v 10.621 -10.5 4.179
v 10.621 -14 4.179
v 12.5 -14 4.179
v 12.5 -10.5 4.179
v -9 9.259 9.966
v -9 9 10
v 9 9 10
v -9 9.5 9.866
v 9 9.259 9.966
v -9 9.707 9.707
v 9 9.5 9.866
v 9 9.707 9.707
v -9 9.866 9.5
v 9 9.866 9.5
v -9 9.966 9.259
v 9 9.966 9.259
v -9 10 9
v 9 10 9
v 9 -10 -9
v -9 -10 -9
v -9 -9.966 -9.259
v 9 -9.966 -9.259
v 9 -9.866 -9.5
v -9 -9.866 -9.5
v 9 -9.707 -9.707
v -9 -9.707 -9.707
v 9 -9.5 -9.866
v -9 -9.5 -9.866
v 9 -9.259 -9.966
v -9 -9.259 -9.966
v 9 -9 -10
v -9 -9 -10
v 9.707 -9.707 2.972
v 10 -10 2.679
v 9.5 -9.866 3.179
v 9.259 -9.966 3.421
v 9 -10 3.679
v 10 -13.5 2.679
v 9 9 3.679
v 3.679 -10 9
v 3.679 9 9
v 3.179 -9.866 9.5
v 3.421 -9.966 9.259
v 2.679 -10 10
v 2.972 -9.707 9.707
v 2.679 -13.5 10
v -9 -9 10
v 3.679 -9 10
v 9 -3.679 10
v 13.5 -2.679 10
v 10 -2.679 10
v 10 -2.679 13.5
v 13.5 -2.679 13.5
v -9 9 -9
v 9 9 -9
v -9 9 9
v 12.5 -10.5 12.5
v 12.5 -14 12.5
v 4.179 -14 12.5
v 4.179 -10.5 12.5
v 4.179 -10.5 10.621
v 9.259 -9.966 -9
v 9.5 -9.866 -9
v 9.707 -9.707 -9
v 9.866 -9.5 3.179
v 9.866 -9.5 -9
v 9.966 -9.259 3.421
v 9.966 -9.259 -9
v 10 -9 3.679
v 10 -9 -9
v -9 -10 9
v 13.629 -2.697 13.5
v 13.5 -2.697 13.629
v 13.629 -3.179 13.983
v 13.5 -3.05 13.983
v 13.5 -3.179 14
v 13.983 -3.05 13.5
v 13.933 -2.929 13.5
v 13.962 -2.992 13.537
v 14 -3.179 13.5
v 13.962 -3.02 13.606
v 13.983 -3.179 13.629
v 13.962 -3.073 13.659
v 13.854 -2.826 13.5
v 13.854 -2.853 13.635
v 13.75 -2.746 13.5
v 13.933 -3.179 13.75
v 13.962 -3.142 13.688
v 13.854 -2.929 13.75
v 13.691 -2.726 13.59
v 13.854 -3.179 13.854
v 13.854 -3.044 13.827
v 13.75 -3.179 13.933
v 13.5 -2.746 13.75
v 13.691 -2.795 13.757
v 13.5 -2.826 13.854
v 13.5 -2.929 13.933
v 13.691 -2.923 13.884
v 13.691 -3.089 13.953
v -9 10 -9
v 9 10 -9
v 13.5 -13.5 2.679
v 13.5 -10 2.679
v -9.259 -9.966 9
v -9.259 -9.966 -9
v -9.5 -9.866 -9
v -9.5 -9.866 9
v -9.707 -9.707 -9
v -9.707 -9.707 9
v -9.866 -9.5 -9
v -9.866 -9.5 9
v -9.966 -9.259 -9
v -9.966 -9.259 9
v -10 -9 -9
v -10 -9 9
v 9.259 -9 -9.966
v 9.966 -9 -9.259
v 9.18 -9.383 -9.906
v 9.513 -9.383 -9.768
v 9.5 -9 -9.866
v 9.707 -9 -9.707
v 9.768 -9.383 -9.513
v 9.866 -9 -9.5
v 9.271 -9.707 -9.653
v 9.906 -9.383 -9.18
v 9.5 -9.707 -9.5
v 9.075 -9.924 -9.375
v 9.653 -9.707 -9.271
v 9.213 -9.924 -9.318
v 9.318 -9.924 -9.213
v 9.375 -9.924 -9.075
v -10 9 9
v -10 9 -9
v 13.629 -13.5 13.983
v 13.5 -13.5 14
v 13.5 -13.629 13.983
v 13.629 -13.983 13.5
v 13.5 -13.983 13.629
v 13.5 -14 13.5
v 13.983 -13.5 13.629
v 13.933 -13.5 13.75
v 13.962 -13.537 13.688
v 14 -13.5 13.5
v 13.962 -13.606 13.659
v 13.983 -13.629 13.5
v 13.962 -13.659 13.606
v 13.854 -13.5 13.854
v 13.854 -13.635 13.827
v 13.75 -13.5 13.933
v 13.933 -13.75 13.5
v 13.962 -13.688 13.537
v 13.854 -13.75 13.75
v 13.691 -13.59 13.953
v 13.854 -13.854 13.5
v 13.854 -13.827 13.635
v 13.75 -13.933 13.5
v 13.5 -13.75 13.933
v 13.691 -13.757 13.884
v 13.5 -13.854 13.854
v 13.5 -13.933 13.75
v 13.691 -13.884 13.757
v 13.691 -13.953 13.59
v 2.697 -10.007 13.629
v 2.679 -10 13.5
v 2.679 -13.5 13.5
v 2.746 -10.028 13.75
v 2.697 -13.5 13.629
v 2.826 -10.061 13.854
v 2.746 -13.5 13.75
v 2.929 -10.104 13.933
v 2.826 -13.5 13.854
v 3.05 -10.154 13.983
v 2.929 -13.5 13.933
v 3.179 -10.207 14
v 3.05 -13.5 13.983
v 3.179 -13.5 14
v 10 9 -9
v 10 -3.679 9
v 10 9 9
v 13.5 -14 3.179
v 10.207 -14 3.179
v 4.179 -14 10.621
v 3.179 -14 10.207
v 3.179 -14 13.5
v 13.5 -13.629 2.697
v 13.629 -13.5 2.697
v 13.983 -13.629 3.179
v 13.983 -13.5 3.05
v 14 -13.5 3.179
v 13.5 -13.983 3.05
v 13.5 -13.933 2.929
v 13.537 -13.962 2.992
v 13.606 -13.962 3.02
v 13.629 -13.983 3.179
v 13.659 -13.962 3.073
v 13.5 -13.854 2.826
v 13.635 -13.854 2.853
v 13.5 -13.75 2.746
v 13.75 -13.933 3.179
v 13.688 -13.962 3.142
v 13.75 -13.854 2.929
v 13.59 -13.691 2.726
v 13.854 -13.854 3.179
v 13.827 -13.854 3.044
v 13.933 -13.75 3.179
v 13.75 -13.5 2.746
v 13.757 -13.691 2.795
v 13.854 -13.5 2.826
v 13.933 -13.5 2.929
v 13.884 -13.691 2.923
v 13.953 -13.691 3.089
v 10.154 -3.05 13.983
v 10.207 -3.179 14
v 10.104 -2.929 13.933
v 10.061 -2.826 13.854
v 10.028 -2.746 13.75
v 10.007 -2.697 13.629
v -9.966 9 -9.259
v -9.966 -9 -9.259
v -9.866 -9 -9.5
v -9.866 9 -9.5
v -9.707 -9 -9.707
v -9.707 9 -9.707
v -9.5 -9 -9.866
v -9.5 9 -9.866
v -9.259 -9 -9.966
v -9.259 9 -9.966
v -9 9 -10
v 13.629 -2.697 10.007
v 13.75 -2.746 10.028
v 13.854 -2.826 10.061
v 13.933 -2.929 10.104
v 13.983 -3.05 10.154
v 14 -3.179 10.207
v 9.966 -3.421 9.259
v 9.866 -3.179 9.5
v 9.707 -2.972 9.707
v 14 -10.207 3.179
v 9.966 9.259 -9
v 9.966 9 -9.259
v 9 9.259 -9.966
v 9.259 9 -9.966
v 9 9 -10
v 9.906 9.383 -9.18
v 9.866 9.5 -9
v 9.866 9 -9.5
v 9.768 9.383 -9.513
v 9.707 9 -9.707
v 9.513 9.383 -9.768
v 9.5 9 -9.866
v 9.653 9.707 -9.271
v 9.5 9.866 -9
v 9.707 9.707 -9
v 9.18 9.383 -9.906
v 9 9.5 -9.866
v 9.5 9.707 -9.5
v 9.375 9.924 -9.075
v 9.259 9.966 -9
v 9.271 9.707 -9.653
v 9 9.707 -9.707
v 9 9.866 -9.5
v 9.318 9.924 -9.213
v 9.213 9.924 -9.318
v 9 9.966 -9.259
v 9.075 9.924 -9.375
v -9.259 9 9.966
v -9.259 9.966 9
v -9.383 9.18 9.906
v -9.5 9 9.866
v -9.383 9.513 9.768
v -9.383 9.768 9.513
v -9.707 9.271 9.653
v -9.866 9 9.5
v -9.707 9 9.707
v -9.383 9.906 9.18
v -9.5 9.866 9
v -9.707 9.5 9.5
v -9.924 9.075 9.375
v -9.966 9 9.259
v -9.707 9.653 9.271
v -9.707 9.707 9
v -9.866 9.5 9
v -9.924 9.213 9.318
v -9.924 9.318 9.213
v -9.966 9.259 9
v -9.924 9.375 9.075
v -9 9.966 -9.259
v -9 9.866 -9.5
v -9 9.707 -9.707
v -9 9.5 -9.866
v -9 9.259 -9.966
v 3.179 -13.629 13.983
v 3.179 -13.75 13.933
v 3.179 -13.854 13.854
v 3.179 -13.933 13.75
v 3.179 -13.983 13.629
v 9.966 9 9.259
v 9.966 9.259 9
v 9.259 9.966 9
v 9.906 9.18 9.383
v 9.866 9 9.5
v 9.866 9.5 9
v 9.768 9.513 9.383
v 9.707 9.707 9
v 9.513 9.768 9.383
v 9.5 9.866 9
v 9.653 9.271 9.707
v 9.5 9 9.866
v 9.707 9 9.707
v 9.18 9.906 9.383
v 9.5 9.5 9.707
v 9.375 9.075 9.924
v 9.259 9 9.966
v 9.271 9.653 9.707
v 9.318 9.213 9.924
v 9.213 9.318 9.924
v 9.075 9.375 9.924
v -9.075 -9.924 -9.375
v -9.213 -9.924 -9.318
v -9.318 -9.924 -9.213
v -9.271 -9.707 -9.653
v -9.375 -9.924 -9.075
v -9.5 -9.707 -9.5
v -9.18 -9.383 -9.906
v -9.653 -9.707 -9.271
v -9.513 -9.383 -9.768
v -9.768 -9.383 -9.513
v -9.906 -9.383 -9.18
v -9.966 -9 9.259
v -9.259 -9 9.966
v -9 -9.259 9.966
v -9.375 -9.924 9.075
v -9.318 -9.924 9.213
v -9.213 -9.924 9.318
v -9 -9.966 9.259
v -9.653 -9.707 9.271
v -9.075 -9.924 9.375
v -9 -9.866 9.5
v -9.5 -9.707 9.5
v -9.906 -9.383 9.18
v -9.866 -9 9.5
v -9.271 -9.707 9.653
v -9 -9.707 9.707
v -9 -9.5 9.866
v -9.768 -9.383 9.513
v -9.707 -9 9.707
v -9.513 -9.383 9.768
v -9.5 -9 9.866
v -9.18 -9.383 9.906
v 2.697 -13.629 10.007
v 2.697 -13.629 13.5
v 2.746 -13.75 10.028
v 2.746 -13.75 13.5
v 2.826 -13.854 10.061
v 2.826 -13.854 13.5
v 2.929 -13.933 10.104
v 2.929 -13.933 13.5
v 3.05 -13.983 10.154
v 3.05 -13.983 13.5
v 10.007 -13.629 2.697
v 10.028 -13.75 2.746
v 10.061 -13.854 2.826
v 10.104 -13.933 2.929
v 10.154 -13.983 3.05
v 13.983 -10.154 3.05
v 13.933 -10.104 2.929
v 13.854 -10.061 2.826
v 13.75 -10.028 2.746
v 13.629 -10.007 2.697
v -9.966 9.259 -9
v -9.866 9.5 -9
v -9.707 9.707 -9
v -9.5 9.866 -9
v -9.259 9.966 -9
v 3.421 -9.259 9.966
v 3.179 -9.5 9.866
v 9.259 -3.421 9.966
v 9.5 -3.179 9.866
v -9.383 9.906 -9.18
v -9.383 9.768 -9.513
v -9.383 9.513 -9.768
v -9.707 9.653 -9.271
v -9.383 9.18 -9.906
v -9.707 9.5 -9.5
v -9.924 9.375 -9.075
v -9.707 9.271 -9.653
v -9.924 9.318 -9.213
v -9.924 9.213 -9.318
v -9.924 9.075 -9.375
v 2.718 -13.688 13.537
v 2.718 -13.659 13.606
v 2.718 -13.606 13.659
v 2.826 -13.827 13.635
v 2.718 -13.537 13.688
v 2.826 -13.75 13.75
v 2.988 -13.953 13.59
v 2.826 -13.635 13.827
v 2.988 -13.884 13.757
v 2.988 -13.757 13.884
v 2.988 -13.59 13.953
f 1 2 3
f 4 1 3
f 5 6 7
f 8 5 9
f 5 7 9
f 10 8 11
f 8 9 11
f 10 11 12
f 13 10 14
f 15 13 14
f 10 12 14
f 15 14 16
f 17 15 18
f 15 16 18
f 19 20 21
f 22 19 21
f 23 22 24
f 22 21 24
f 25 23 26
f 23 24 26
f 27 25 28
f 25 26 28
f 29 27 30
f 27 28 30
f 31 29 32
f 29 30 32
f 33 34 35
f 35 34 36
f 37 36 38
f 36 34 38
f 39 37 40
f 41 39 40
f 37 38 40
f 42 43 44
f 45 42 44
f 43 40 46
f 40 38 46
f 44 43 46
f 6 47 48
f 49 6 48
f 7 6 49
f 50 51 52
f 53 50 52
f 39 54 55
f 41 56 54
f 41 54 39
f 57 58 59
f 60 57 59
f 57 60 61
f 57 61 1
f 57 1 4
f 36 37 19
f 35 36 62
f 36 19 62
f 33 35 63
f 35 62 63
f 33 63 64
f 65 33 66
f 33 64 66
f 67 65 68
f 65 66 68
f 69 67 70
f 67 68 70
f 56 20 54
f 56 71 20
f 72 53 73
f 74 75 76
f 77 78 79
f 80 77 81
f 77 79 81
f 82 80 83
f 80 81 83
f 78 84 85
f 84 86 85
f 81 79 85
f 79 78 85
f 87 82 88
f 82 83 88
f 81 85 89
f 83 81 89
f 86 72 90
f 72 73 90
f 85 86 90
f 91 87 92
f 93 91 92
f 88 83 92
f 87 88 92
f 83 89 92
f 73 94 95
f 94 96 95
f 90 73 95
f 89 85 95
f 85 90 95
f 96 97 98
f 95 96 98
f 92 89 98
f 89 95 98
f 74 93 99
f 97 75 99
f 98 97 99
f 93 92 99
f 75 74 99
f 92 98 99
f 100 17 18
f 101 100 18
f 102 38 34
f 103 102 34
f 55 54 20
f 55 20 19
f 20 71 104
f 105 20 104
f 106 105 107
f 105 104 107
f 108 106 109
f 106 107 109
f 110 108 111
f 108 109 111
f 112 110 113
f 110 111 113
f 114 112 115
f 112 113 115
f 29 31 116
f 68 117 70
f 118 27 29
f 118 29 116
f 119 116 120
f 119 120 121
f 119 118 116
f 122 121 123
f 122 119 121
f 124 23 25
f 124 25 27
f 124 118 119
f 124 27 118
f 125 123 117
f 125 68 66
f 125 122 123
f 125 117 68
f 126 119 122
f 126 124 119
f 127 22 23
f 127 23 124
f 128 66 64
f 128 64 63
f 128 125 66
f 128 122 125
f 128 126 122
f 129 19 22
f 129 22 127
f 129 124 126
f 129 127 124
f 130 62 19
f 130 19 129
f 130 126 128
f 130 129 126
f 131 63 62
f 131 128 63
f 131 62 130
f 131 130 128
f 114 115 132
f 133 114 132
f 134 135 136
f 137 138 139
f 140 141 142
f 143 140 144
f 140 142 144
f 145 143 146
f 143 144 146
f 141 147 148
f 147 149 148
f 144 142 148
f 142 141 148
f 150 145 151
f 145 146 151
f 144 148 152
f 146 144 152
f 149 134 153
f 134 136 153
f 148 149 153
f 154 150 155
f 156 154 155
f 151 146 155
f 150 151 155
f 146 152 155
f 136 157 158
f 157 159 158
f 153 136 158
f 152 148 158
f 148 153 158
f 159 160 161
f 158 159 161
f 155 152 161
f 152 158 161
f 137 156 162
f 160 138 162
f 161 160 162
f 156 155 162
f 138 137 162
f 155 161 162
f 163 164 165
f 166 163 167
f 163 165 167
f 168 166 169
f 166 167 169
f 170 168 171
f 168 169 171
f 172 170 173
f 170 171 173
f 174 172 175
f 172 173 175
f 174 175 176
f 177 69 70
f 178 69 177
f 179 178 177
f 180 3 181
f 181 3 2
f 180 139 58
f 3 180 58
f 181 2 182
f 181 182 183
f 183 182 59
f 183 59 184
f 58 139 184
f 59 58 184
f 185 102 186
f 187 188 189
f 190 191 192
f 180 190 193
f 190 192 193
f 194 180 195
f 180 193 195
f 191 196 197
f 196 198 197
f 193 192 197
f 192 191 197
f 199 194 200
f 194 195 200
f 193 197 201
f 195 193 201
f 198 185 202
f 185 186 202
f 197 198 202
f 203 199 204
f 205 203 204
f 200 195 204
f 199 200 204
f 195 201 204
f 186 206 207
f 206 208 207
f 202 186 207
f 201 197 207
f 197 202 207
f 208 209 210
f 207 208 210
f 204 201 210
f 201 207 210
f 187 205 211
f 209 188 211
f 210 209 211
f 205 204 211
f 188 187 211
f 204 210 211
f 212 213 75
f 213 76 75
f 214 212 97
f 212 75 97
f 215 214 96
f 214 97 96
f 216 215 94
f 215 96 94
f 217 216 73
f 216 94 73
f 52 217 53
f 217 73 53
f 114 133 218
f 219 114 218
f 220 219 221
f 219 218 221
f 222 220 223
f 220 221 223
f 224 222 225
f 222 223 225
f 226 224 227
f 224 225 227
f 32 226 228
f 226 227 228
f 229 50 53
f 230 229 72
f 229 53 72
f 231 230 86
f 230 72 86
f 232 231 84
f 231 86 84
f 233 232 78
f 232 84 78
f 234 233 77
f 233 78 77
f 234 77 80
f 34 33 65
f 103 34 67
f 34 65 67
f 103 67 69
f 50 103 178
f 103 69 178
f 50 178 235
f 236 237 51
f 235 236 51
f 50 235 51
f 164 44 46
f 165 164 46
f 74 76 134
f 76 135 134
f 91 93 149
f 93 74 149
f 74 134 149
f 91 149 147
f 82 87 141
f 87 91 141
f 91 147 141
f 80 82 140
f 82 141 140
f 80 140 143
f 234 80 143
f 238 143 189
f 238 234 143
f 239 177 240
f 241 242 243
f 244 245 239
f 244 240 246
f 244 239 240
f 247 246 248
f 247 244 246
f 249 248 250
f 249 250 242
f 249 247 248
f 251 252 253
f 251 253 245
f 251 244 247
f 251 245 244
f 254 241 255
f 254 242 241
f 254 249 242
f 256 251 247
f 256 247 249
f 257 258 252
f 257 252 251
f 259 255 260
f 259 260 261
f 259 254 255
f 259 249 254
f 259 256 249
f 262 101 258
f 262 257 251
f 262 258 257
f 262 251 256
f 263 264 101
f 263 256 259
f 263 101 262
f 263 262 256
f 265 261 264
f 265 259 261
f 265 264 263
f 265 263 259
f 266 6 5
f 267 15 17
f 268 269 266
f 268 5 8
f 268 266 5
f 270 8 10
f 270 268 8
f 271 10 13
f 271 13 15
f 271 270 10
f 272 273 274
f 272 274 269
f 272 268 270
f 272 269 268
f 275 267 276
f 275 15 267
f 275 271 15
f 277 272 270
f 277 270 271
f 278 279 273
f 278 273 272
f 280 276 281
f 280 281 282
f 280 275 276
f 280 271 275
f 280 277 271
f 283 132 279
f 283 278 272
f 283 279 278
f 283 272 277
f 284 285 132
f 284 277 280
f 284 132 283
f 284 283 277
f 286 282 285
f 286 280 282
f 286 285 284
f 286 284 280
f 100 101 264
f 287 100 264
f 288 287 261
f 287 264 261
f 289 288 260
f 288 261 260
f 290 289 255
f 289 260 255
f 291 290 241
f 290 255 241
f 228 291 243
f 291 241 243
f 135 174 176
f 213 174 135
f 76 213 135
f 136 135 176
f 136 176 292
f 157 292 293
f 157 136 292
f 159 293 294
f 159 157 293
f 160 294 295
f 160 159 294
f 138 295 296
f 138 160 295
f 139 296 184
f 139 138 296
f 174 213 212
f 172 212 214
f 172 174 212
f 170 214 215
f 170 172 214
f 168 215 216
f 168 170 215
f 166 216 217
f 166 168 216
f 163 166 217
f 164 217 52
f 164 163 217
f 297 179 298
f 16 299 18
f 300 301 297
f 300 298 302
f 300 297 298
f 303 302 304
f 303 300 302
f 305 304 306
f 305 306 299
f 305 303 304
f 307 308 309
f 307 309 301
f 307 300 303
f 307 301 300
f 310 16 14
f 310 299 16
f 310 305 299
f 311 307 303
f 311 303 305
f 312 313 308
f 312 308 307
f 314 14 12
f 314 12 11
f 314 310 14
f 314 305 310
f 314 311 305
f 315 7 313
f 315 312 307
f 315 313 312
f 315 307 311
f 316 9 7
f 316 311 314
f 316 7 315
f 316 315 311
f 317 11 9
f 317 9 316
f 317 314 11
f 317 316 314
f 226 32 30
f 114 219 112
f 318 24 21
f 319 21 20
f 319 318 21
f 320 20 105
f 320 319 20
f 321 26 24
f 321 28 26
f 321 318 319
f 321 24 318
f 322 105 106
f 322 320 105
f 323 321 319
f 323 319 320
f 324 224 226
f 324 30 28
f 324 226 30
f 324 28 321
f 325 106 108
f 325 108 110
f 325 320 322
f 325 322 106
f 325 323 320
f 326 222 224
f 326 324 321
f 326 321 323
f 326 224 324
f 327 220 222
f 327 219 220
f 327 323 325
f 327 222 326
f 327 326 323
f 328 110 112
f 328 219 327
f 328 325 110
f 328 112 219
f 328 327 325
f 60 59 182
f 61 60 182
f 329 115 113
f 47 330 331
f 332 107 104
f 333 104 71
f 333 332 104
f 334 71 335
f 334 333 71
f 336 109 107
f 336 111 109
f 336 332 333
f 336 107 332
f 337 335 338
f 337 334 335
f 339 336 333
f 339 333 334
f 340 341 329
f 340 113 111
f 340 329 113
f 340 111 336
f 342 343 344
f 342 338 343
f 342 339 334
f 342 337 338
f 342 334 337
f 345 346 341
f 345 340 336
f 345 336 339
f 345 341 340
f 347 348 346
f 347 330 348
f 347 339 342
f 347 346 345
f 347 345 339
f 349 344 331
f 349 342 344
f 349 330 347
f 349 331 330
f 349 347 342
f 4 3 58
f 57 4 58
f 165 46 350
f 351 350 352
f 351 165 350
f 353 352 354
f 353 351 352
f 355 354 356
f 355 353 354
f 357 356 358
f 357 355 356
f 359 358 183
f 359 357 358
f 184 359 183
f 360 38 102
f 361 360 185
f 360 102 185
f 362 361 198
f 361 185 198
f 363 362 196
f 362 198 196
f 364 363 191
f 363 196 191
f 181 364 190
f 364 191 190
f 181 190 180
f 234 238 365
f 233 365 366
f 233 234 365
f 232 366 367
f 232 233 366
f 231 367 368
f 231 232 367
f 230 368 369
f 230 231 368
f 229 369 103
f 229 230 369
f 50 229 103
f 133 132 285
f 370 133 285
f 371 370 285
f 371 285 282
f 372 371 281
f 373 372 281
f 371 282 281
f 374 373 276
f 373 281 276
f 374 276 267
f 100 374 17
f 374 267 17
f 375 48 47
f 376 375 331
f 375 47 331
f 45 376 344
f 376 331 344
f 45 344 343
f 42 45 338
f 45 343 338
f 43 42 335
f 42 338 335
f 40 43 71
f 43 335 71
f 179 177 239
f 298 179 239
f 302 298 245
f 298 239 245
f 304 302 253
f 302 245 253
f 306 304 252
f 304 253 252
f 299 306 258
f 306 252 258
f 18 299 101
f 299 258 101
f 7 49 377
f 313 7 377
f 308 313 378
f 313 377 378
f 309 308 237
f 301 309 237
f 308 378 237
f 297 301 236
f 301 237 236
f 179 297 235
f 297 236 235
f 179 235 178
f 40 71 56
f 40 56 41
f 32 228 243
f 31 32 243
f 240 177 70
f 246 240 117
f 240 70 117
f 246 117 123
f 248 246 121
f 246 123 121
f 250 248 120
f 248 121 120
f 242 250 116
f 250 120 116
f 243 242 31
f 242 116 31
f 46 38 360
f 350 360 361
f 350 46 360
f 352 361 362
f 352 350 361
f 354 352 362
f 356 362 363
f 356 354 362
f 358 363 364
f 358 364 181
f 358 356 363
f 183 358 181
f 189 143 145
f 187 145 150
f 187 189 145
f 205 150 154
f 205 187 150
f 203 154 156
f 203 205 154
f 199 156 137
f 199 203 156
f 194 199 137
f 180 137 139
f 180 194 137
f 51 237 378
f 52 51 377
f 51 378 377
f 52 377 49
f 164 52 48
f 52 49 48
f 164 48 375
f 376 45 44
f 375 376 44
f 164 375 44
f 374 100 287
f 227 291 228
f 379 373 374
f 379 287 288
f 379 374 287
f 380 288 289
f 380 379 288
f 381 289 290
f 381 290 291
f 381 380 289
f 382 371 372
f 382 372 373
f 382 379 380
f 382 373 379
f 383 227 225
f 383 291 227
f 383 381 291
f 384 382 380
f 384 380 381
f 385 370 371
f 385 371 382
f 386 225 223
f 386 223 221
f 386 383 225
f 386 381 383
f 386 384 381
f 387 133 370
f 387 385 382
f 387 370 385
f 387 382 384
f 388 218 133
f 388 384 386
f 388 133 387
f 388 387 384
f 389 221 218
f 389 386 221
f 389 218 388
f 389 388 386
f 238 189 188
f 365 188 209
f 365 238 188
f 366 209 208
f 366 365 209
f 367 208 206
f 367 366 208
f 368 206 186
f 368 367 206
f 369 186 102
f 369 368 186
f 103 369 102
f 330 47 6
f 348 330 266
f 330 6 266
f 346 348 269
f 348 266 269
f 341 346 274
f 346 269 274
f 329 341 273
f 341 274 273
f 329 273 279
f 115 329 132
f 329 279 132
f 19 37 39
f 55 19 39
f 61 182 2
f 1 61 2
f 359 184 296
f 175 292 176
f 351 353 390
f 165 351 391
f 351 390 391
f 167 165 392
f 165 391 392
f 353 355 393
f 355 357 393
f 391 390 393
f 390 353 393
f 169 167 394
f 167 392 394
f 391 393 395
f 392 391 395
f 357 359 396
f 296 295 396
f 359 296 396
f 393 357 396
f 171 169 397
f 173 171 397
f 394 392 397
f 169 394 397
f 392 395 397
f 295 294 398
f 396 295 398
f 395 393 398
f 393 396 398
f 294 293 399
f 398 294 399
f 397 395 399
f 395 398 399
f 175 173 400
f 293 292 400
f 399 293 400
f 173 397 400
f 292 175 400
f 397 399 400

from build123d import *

# Parameters (mm, degrees)
IZIM1_W                     = 20
IZIM1_H                     = 20
Y_KSEKLIK_EKSTR_ZYON1_DEPTH = 10
BO_ALTMA1_T                 = -1
Y_KSEKLIK_EKSTR_ZYON3_DEPTH = 4
Y_KSEKLIK_EKSTR_ZYON4_DEPTH = 4
Y_KSEKLIK_EKSTR_ZYON5_REACH = 33.113
RADYUS1_R                   = 1
RADYUS2_R                   = 1
RADYUS3_R                   = 0.5
KES_EKSTR_ZYON1_DEPTH       = 3.5


with BuildPart() as part:
    # Çizim1 → Yükseklik-Ekstrüzyon1 (new, symmetric)
    with BuildSketch(Plane.XY):
        Rectangle(IZIM1_W, IZIM1_H)
    extrude(amount=Y_KSEKLIK_EKSTR_ZYON1_DEPTH, both=True)

    # İç Boşaltma1
    bo_altma1_openings = [part.faces().sort_by_distance(p)[0] for p in [
        (0, -10, 0),
    ]]
    offset(amount=BO_ALTMA1_T, openings=bo_altma1_openings, kind=Kind.INTERSECTION)

    # Çizim6 → Yükseklik-Ekstrüzyon3 (add)
    with BuildSketch(Plane(origin=(10, 0, 0), x_dir=(0, 0, -1), z_dir=(1, 0, 0))):
        Polygon((-2.679491924, -10), (-10, -2.679491924), (-10, -10), align=None)
        Polygon((-10, -10), (-10, -2.679491924), (-14, -2.679491924), (-14, -14), (-2.679491924, -14), (-2.679491924, -10), align=None)
    extrude(amount=Y_KSEKLIK_EKSTR_ZYON3_DEPTH)

    # Çizim7 → Yükseklik-Ekstrüzyon4 (add)
    with BuildSketch(Plane.XY.offset(10)):
        Polygon((10, -2.679491924), (2.679491924, -10), (2.679491924, -14), (10, -14), align=None)
    extrude(amount=Y_KSEKLIK_EKSTR_ZYON4_DEPTH)

    # Yükseklik-Ekstrüzyon5: up to this face of the body (flat: up to its plane)
    y_kseklik_ekstr_zyon5_end = Plane(part.part.faces().sort_by_distance((0, 9, 0))[0])
    # Çizim8 → Yükseklik-Ekstrüzyon5 (add, up to the picked face)
    with BuildSketch(Plane.XZ.offset(14), mode=Mode.PRIVATE) as y_kseklik_ekstr_zyon5_sk1:
        Polygon((10, 2.679491924), (2.679491924, 10), (10, 10), align=None)
    y_kseklik_ekstr_zyon5_tool1 = split(extrude(y_kseklik_ekstr_zyon5_sk1.sketch, amount=-Y_KSEKLIK_EKSTR_ZYON5_REACH, mode=Mode.PRIVATE), bisect_by=y_kseklik_ekstr_zyon5_end, keep=Keep.BOTH, mode=Mode.PRIVATE)
    add(y_kseklik_ekstr_zyon5_tool1.solids().sort_by(Axis((7.559831, -14, 7.559831), (0, 1, 0)))[0])

    # Radyus1
    # the kernel refuses this fillet: 1 mm, written as the material it takes off along each edge
    with BuildSketch(Plane(origin=(-9, 9, 9), x_dir=(0, 0, 1), z_dir=(-1, 0, 0))) as radyus1_piece_1_section:
        Polygon((0, 0), (RADYUS1_R, 0), (RADYUS1_R, RADYUS1_R), (0, RADYUS1_R), align=None)
    radyus1_piece_1 = extrude(amount=RADYUS1_R, mode=Mode.PRIVATE)
    radyus1_piece_1 = radyus1_piece_1 - Plane(origin=(-9, 9, 9), x_dir=(0, -0.7071067811865475, -0.7071067811865475), z_dir=(-1, 0, 0)) * Sphere(RADYUS1_R, mode=Mode.PRIVATE)
    add(radyus1_piece_1, mode=Mode.SUBTRACT)
    with BuildSketch(Plane(origin=(9, 9, 9), x_dir=(1, 0, 0), z_dir=(0, 0, 1))) as radyus1_piece_2_section:
        Polygon((0, 0), (RADYUS1_R, 0), (RADYUS1_R, RADYUS1_R), (0, RADYUS1_R), align=None)
    radyus1_piece_2 = extrude(amount=RADYUS1_R, mode=Mode.PRIVATE)
    radyus1_piece_2 = radyus1_piece_2 - Plane(origin=(9, 9, 9), x_dir=(-0.7071067811865475, -0.7071067811865475, 0), z_dir=(0, 0, 1)) * Sphere(RADYUS1_R, mode=Mode.PRIVATE)
    add(radyus1_piece_2, mode=Mode.SUBTRACT)
    with BuildSketch(Plane(origin=(-9, 9, -9), x_dir=(0, 1, 0), z_dir=(-1, 0, 0))) as radyus1_piece_3_section:
        Polygon((0, 0), (RADYUS1_R, 0), (RADYUS1_R, RADYUS1_R), (0, RADYUS1_R), align=None)
    radyus1_piece_3 = extrude(amount=RADYUS1_R, mode=Mode.PRIVATE)
    radyus1_piece_3 = radyus1_piece_3 - Plane(origin=(-9, 9, -9), x_dir=(0, -0.7071067811865475, 0.7071067811865475), z_dir=(-1, 0, 0)) * Sphere(RADYUS1_R, mode=Mode.PRIVATE)
    add(radyus1_piece_3, mode=Mode.SUBTRACT)
    with BuildSketch(Plane(origin=(9, 9, -9), x_dir=(1, 0, 0), z_dir=(0, 1, 0))) as radyus1_piece_4_section:
        Polygon((0, 0), (RADYUS1_R, 0), (RADYUS1_R, RADYUS1_R), (0, RADYUS1_R), align=None)
    radyus1_piece_4 = extrude(amount=RADYUS1_R, mode=Mode.PRIVATE)
    radyus1_piece_4 = radyus1_piece_4 - Plane(origin=(9, 9, -9), x_dir=(-0.7071067811865475, 0, 0.7071067811865475), z_dir=(0, 1, 0)) * Sphere(RADYUS1_R, mode=Mode.PRIVATE)
    add(radyus1_piece_4, mode=Mode.SUBTRACT)
    with BuildSketch(Plane(origin=(-10, 9, 10), x_dir=(0, 0, -1), z_dir=(0, -1, 0))) as radyus1_piece_5:
        with BuildLine():
            CenterArc((RADYUS1_R, RADYUS1_R), RADYUS1_R, 180, 90)
            Line((0, RADYUS1_R), (0, 0))
            Line((0, 0), (RADYUS1_R, 0))
        make_face()
    extrude(amount=21.5, mode=Mode.SUBTRACT)
    with BuildSketch(Plane(origin=(10, -5.179491924, 10), x_dir=(0, 0, -1), z_dir=(0, 1, 0))) as radyus1_piece_6_section:
        with BuildLine():
            CenterArc((RADYUS1_R, RADYUS1_R), RADYUS1_R, 180, 90)
            Line((0, RADYUS1_R), (0, 0))
            Line((0, 0), (RADYUS1_R, 0))
        make_face()
    radyus1_piece_6 = extrude(amount=14.179491924, mode=Mode.PRIVATE)
    radyus1_piece_6 = split(radyus1_piece_6, bisect_by=Plane(origin=(9.471072473, -2.843960274, 9.83553165), z_dir=(0, -0.7071067811865475, 0.7071067811865477)), keep=Keep.TOP, mode=Mode.PRIVATE)
    radyus1_piece_6 = split(radyus1_piece_6, bisect_by=Plane(origin=(9.592558865, -3.086933059, 9.957018042), z_dir=(-0.7071067811865479, 0.7071067811865472, 0)), keep=Keep.TOP, mode=Mode.PRIVATE)
    add(radyus1_piece_6, mode=Mode.SUBTRACT)
    with BuildSketch(Plane(origin=(10, -5.179491924, 10), x_dir=(0, 0, -1), z_dir=(0, 1, 0))) as radyus1_piece_7_section:
        with BuildLine():
            CenterArc((RADYUS1_R, RADYUS1_R), RADYUS1_R, 180, 90)
            Line((0, RADYUS1_R), (0, 0))
            Line((0, 0), (RADYUS1_R, 0))
        make_face()
    radyus1_piece_7 = extrude(amount=14.179491924, mode=Mode.PRIVATE)
    radyus1_piece_7 = split(radyus1_piece_7, bisect_by=Plane(origin=(9.957018042, -3.086933059, 9.592558865), z_dir=(0, 0.7071067811865475, -0.7071067811865477)), keep=Keep.TOP, mode=Mode.PRIVATE)
    radyus1_piece_7 = split(radyus1_piece_7, bisect_by=Plane(origin=(9.83553165, -2.843960274, 9.471072473), z_dir=(0.7071067811865479, -0.7071067811865472, 0)), keep=Keep.TOP, mode=Mode.PRIVATE)
    add(radyus1_piece_7, mode=Mode.SUBTRACT)
    with BuildSketch(Plane(origin=(10, -5.179491924, 10), x_dir=(0, 0, -1), z_dir=(0, 1, 0))) as radyus1_piece_8_section:
        with BuildLine():
            CenterArc((RADYUS1_R, RADYUS1_R), RADYUS1_R, 180, 90)
            Line((0, RADYUS1_R), (0, 0))
            Line((0, 0), (RADYUS1_R, 0))
        make_face()
    radyus1_piece_8 = extrude(amount=14.179491924, mode=Mode.PRIVATE)
    radyus1_piece_8 = split(radyus1_piece_8, bisect_by=Plane(origin=(9.773566739, 0.108490737, 12.787982661), z_dir=(0, 0.7071067811865475, -0.7071067811865477)), keep=Keep.TOP, mode=Mode.PRIVATE)
    radyus1_piece_8 = split(radyus1_piece_8, bisect_by=Plane(origin=(12.787982661, 0.108490737, 9.773566739), z_dir=(-0.7071067811865479, 0.7071067811865472, 0)), keep=Keep.TOP, mode=Mode.PRIVATE)
    add(radyus1_piece_8, mode=Mode.SUBTRACT)
    with BuildSketch(Plane(origin=(-10, 9, -10), x_dir=(0, 0, 1), z_dir=(0, -1, 0)), Plane(origin=(10, -12.5, -10), x_dir=(0, 0, 1), z_dir=(0, 1, 0))) as radyus1_piece_9:
        with BuildLine():
            CenterArc((RADYUS1_R, -RADYUS1_R), RADYUS1_R, 90, 90)
            Line((0, -RADYUS1_R), (0, 0))
            Line((0, 0), (RADYUS1_R, 0))
        make_face()
    extrude(amount=21.5, mode=Mode.SUBTRACT)
    with BuildSketch(Plane(origin=(9, 10, -10), x_dir=(0, 0, 1), z_dir=(-1, 0, 0)), Plane(origin=(-10, 10, 9), x_dir=(0, -1, 0), z_dir=(0, 0, -1))) as radyus1_piece_10:
        with BuildLine():
            CenterArc((RADYUS1_R, -RADYUS1_R), RADYUS1_R, 90, 90)
            Line((0, -RADYUS1_R), (0, 0))
            Line((0, 0), (RADYUS1_R, 0))
        make_face()
    extrude(amount=18, mode=Mode.SUBTRACT)
    with BuildSketch(Plane(origin=(9, 10, 10), x_dir=(0, 0, -1), z_dir=(-1, 0, 0)), Plane(origin=(10, 10, -9), x_dir=(-1, 0, 0), z_dir=(0, 0, 1))) as radyus1_piece_11:
        with BuildLine():
            CenterArc((RADYUS1_R, RADYUS1_R), RADYUS1_R, 180, 90)
            Line((0, RADYUS1_R), (0, 0))
            Line((0, 0), (RADYUS1_R, 0))
        make_face()
    extrude(amount=18, mode=Mode.SUBTRACT)

    # Radyus2
    # the kernel refuses this fillet: 1 mm, written as the material it takes off along each edge
    with BuildSketch(Plane(origin=(-9, -10, 10), x_dir=(0, 0, -1), z_dir=(1, 0, 0))) as radyus2_piece_1_section:
        with BuildLine():
            CenterArc((RADYUS2_R, RADYUS2_R), RADYUS2_R, 180, 90)
            Line((0, RADYUS2_R), (0, 0))
            Line((0, 0), (RADYUS2_R, 0))
        make_face()
    radyus2_piece_1 = extrude(amount=14.179491924, mode=Mode.PRIVATE)
    radyus2_piece_1 = split(radyus2_piece_1, bisect_by=Plane(origin=(-0.108490737, -9.773566739, 12.787982661), z_dir=(-0.7071067811865476, 0, -0.7071067811865475)), keep=Keep.TOP, mode=Mode.PRIVATE)
    radyus2_piece_1 = split(radyus2_piece_1, bisect_by=Plane(origin=(-0.108490737, -12.787982661, 9.773566739), z_dir=(-0.7071067811865479, 0.7071067811865472, 0)), keep=Keep.TOP, mode=Mode.PRIVATE)
    add(radyus2_piece_1, mode=Mode.SUBTRACT)
    with BuildSketch(Plane(origin=(-9, -10, 10), x_dir=(0, 0, -1), z_dir=(1, 0, 0))) as radyus2_piece_2_section:
        with BuildLine():
            CenterArc((RADYUS2_R, RADYUS2_R), RADYUS2_R, 180, 90)
            Line((0, RADYUS2_R), (0, 0))
            Line((0, 0), (RADYUS2_R, 0))
        make_face()
    radyus2_piece_2 = extrude(amount=14.179491924, mode=Mode.PRIVATE)
    radyus2_piece_2 = split(radyus2_piece_2, bisect_by=Plane(origin=(2.843960274, -9.471072473, 9.83553165), z_dir=(0.7071067811865476, 0, 0.7071067811865475)), keep=Keep.TOP, mode=Mode.PRIVATE)
    radyus2_piece_2 = split(radyus2_piece_2, bisect_by=Plane(origin=(3.086933059, -9.592558865, 9.957018042), z_dir=(-0.7071067811865479, 0.7071067811865472, 0)), keep=Keep.TOP, mode=Mode.PRIVATE)
    add(radyus2_piece_2, mode=Mode.SUBTRACT)
    with BuildSketch(Plane(origin=(-9, -10, 10), x_dir=(0, 0, -1), z_dir=(1, 0, 0))) as radyus2_piece_3_section:
        with BuildLine():
            CenterArc((RADYUS2_R, RADYUS2_R), RADYUS2_R, 180, 90)
            Line((0, RADYUS2_R), (0, 0))
            Line((0, 0), (RADYUS2_R, 0))
        make_face()
    radyus2_piece_3 = extrude(amount=14.179491924, mode=Mode.PRIVATE)
    radyus2_piece_3 = split(radyus2_piece_3, bisect_by=Plane(origin=(3.086933059, -9.957018042, 9.592558865), z_dir=(-0.7071067811865476, 0, -0.7071067811865475)), keep=Keep.TOP, mode=Mode.PRIVATE)
    radyus2_piece_3 = split(radyus2_piece_3, bisect_by=Plane(origin=(2.843960274, -9.83553165, 9.471072473), z_dir=(0.7071067811865479, -0.7071067811865472, 0)), keep=Keep.TOP, mode=Mode.PRIVATE)
    add(radyus2_piece_3, mode=Mode.SUBTRACT)
    with BuildSketch(Plane(origin=(-9, -10, 9), x_dir=(-1, 0, 0), z_dir=(0, 0, -1))) as radyus2_piece_4:
        with BuildLine():
            CenterArc((1 - RADYUS2_R, RADYUS2_R), RADYUS2_R, 270, 90)
            Line((1 - RADYUS2_R, 0), (1, 0))
            Line((1, 0), (1, RADYUS2_R))
        make_face()
    revolve(axis=Axis((-9, -10, 9), (0, 1, 0)), revolution_arc=90, mode=Mode.SUBTRACT)
    with BuildSketch(Plane(origin=(-10, -10, 9), x_dir=(0, 1, 0), z_dir=(0, 0, -1))) as radyus2_piece_5:
        with BuildLine():
            CenterArc((RADYUS2_R, RADYUS2_R), RADYUS2_R, 180, 90)
            Line((0, RADYUS2_R), (0, 0))
            Line((0, 0), (RADYUS2_R, 0))
        make_face()
    extrude(amount=18, mode=Mode.SUBTRACT)
    with BuildSketch(Plane(origin=(-9, -10, -9), x_dir=(0, 0, -1), z_dir=(1, 0, 0))) as radyus2_piece_6:
        with BuildLine():
            CenterArc((1 - RADYUS2_R, RADYUS2_R), RADYUS2_R, 270, 90)
            Line((1, RADYUS2_R), (1, 0))
            Line((1, 0), (1 - RADYUS2_R, 0))
        make_face()
    revolve(axis=Axis((-9, -10, -9), (0, 1, 0)), revolution_arc=90, mode=Mode.SUBTRACT)
    with BuildSketch(Plane(origin=(-9, -10, -10), x_dir=(0, 0, 1), z_dir=(1, 0, 0))) as radyus2_piece_7:
        with BuildLine():
            CenterArc((RADYUS2_R, -RADYUS2_R), RADYUS2_R, 90, 90)
            Line((0, -RADYUS2_R), (0, 0))
            Line((0, 0), (RADYUS2_R, 0))
        make_face()
    extrude(amount=18, mode=Mode.SUBTRACT)
    with BuildSketch(Plane(origin=(9, -10, -9), x_dir=(0, 0, -1), z_dir=(-1, 0, 0))) as radyus2_piece_8:
        with BuildLine():
            CenterArc((1 - RADYUS2_R, -RADYUS2_R), RADYUS2_R, 0, 90)
            Line((1, -RADYUS2_R), (1, 0))
            Line((1, 0), (1 - RADYUS2_R, 0))
        make_face()
    revolve(axis=Axis((9, -10, -9), (0, -1, 0)), revolution_arc=90, mode=Mode.SUBTRACT)
    with BuildSketch(Plane(origin=(10, -10, -9), x_dir=(-1, 0, 0), z_dir=(0, 0, 1))) as radyus2_piece_9_section:
        with BuildLine():
            CenterArc((RADYUS2_R, -RADYUS2_R), RADYUS2_R, 90, 90)
            Line((0, -RADYUS2_R), (0, 0))
            Line((0, 0), (RADYUS2_R, 0))
        make_face()
    radyus2_piece_9 = extrude(amount=14.179491924, mode=Mode.PRIVATE)
    radyus2_piece_9 = split(radyus2_piece_9, bisect_by=Plane(origin=(12.787982661, -9.773566739, -0.108490737), z_dir=(-0.7071067811865476, 0, -0.7071067811865475)), keep=Keep.TOP, mode=Mode.PRIVATE)
    radyus2_piece_9 = split(radyus2_piece_9, bisect_by=Plane(origin=(9.773566739, -12.787982661, -0.108490737), z_dir=(0, 0.7071067811865475, -0.7071067811865477)), keep=Keep.TOP, mode=Mode.PRIVATE)
    add(radyus2_piece_9, mode=Mode.SUBTRACT)
    with BuildSketch(Plane(origin=(10, -10, -9), x_dir=(-1, 0, 0), z_dir=(0, 0, 1))) as radyus2_piece_10_section:
        with BuildLine():
            CenterArc((RADYUS2_R, -RADYUS2_R), RADYUS2_R, 90, 90)
            Line((0, -RADYUS2_R), (0, 0))
            Line((0, 0), (RADYUS2_R, 0))
        make_face()
    radyus2_piece_10 = extrude(amount=14.179491924, mode=Mode.PRIVATE)
    radyus2_piece_10 = split(radyus2_piece_10, bisect_by=Plane(origin=(9.83553165, -9.471072473, 2.843960274), z_dir=(0.7071067811865476, 0, 0.7071067811865475)), keep=Keep.TOP, mode=Mode.PRIVATE)
    radyus2_piece_10 = split(radyus2_piece_10, bisect_by=Plane(origin=(9.957018042, -9.592558865, 3.086933059), z_dir=(0, 0.7071067811865475, -0.7071067811865477)), keep=Keep.TOP, mode=Mode.PRIVATE)
    add(radyus2_piece_10, mode=Mode.SUBTRACT)
    with BuildSketch(Plane(origin=(10, -10, -9), x_dir=(-1, 0, 0), z_dir=(0, 0, 1))) as radyus2_piece_11_section:
        with BuildLine():
            CenterArc((RADYUS2_R, -RADYUS2_R), RADYUS2_R, 90, 90)
            Line((0, -RADYUS2_R), (0, 0))
            Line((0, 0), (RADYUS2_R, 0))
        make_face()
    radyus2_piece_11 = extrude(amount=14.179491924, mode=Mode.PRIVATE)
    radyus2_piece_11 = split(radyus2_piece_11, bisect_by=Plane(origin=(9.592558865, -9.957018042, 3.086933059), z_dir=(-0.7071067811865476, 0, -0.7071067811865475)), keep=Keep.TOP, mode=Mode.PRIVATE)
    radyus2_piece_11 = split(radyus2_piece_11, bisect_by=Plane(origin=(9.471072473, -9.83553165, 2.843960274), z_dir=(0, -0.7071067811865475, 0.7071067811865477)), keep=Keep.TOP, mode=Mode.PRIVATE)
    add(radyus2_piece_11, mode=Mode.SUBTRACT)

    # Radyus3
    radyus3_edges = [part.edges().sort_by_distance(p)[0] for p in [
        (14, -6.339745962, 6.339745962),
        (12, -2.679491924, 14),
        (8.339745962, -14, 14),
        (14, -12, 2.679491924),
        (12, -14, 2.679491924),
        (14, -2.679491924, 12),
        (14, -8.339745962, 14),
        (14, -14, 8.339745962),
        (2.679491924, -14, 12),
        (6.339745962, -6.339745962, 14),
        (2.679491924, -12, 14),
        (6.339745962, -14, 6.339745962),
    ]]
    fillet(radyus3_edges, radius=RADYUS3_R)

    # Çizim9 → Kes-Ekstrüzyon1 (cut)
    with BuildSketch(Plane.XZ.offset(14)):
        Polygon((12.5, 4.179491924), (12.5, 12.5), (4.179491924, 12.5), (4.179491924, 10.621320344), (10.621320344, 4.179491924), align=None)
    extrude(amount=-KES_EKSTR_ZYON1_DEPTH, mode=Mode.SUBTRACT)


solid = part.part
